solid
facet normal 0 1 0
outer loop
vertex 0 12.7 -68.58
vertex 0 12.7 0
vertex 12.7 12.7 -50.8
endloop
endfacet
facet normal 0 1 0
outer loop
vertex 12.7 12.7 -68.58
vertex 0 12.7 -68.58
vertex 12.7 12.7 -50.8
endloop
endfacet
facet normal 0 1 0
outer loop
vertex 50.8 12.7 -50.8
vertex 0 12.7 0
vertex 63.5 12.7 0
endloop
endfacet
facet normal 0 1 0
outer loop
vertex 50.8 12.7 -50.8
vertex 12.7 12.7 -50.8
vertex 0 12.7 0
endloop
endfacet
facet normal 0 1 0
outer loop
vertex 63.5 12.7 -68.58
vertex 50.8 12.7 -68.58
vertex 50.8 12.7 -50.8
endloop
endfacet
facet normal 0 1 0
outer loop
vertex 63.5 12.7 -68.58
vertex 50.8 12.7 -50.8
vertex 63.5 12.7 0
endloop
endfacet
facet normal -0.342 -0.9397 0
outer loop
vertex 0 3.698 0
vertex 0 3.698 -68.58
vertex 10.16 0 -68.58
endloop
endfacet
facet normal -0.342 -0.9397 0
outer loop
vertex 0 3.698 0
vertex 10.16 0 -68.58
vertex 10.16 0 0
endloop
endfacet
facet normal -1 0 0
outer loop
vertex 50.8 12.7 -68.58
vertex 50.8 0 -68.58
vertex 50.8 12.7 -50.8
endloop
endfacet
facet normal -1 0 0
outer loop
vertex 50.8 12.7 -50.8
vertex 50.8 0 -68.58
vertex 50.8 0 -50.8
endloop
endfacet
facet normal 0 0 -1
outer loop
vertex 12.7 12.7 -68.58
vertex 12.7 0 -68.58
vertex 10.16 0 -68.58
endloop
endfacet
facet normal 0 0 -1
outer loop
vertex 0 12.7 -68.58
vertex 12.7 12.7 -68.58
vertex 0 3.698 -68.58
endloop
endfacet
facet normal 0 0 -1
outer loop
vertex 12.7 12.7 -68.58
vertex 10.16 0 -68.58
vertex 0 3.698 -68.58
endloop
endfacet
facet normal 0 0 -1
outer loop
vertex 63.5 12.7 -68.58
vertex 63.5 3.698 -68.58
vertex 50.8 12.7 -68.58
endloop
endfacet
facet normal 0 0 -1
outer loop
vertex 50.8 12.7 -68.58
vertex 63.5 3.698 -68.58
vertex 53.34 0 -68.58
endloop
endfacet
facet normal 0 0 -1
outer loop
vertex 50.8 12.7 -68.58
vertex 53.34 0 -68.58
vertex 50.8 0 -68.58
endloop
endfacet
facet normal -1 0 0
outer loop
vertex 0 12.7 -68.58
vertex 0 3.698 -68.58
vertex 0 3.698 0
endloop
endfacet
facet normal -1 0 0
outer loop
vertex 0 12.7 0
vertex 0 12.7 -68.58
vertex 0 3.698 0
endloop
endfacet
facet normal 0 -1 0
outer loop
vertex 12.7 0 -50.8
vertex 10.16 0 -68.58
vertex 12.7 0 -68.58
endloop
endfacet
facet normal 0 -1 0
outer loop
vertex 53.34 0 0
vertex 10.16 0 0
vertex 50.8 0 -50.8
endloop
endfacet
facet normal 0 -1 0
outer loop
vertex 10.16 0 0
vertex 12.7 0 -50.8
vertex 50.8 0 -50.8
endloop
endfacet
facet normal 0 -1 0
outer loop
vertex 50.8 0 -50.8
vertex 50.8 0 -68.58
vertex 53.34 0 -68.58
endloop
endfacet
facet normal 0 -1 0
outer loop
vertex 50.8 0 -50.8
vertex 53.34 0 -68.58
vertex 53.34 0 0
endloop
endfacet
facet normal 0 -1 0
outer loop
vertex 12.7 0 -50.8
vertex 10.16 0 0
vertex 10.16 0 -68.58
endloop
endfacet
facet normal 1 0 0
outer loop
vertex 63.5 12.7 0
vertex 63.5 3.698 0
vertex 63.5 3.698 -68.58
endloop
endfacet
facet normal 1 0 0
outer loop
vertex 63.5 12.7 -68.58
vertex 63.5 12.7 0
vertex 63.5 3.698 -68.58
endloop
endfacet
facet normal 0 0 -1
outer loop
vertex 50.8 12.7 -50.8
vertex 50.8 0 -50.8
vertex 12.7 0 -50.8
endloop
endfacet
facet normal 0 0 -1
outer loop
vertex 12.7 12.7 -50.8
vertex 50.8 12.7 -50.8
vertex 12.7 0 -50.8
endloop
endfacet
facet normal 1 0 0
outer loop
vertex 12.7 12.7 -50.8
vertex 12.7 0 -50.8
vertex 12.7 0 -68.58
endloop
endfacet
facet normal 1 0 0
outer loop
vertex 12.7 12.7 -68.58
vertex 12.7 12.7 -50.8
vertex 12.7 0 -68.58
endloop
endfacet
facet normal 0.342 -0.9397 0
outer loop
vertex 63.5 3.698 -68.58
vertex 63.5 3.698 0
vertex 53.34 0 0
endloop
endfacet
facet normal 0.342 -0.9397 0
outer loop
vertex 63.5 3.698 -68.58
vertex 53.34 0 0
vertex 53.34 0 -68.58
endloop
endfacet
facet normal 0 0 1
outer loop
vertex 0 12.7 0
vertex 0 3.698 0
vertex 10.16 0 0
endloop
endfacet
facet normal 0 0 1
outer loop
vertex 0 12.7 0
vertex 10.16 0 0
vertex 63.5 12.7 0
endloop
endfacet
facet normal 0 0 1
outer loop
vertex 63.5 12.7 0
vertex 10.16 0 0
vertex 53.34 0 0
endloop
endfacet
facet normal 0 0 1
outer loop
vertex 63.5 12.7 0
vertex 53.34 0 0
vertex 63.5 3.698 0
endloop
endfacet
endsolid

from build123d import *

# Parameters (mm, degrees)
BOSS_EXTRUDE1_DEPTH = 12.7
CHAMFER1_SIZE       = 10.16
CHAMFER1_SIZE2      = 3.69793758


with BuildPart() as part:
    # Sketch1 → Boss-Extrude1 (new body)
    with BuildSketch(Plane(origin=(0, 0, 0), x_dir=(1, 0, 0), z_dir=(0, 1, 0))):
        Polygon((0, 0), (63.5, 0), (63.5, 68.58), (50.8, 68.58), (50.8, 50.8), (12.7, 50.8), (12.7, 68.58), (0, 68.58), align=None)
    extrude(amount=BOSS_EXTRUDE1_DEPTH)

    # Chamfer1
    chamfer1_edges = [part.edges().sort_by_distance(p)[0] for p in [
        (0, 0, -34.29),
        (63.5, 0, -34.29),
    ]]
    chamfer1_side = [part.faces().sort_by_distance(p)[0] for p in [
        (31.75, 0, -29.611052632),
    ]]
    chamfer(chamfer1_edges, length=CHAMFER1_SIZE, length2=CHAMFER1_SIZE2, reference=chamfer1_side[0])


solid = part.part
